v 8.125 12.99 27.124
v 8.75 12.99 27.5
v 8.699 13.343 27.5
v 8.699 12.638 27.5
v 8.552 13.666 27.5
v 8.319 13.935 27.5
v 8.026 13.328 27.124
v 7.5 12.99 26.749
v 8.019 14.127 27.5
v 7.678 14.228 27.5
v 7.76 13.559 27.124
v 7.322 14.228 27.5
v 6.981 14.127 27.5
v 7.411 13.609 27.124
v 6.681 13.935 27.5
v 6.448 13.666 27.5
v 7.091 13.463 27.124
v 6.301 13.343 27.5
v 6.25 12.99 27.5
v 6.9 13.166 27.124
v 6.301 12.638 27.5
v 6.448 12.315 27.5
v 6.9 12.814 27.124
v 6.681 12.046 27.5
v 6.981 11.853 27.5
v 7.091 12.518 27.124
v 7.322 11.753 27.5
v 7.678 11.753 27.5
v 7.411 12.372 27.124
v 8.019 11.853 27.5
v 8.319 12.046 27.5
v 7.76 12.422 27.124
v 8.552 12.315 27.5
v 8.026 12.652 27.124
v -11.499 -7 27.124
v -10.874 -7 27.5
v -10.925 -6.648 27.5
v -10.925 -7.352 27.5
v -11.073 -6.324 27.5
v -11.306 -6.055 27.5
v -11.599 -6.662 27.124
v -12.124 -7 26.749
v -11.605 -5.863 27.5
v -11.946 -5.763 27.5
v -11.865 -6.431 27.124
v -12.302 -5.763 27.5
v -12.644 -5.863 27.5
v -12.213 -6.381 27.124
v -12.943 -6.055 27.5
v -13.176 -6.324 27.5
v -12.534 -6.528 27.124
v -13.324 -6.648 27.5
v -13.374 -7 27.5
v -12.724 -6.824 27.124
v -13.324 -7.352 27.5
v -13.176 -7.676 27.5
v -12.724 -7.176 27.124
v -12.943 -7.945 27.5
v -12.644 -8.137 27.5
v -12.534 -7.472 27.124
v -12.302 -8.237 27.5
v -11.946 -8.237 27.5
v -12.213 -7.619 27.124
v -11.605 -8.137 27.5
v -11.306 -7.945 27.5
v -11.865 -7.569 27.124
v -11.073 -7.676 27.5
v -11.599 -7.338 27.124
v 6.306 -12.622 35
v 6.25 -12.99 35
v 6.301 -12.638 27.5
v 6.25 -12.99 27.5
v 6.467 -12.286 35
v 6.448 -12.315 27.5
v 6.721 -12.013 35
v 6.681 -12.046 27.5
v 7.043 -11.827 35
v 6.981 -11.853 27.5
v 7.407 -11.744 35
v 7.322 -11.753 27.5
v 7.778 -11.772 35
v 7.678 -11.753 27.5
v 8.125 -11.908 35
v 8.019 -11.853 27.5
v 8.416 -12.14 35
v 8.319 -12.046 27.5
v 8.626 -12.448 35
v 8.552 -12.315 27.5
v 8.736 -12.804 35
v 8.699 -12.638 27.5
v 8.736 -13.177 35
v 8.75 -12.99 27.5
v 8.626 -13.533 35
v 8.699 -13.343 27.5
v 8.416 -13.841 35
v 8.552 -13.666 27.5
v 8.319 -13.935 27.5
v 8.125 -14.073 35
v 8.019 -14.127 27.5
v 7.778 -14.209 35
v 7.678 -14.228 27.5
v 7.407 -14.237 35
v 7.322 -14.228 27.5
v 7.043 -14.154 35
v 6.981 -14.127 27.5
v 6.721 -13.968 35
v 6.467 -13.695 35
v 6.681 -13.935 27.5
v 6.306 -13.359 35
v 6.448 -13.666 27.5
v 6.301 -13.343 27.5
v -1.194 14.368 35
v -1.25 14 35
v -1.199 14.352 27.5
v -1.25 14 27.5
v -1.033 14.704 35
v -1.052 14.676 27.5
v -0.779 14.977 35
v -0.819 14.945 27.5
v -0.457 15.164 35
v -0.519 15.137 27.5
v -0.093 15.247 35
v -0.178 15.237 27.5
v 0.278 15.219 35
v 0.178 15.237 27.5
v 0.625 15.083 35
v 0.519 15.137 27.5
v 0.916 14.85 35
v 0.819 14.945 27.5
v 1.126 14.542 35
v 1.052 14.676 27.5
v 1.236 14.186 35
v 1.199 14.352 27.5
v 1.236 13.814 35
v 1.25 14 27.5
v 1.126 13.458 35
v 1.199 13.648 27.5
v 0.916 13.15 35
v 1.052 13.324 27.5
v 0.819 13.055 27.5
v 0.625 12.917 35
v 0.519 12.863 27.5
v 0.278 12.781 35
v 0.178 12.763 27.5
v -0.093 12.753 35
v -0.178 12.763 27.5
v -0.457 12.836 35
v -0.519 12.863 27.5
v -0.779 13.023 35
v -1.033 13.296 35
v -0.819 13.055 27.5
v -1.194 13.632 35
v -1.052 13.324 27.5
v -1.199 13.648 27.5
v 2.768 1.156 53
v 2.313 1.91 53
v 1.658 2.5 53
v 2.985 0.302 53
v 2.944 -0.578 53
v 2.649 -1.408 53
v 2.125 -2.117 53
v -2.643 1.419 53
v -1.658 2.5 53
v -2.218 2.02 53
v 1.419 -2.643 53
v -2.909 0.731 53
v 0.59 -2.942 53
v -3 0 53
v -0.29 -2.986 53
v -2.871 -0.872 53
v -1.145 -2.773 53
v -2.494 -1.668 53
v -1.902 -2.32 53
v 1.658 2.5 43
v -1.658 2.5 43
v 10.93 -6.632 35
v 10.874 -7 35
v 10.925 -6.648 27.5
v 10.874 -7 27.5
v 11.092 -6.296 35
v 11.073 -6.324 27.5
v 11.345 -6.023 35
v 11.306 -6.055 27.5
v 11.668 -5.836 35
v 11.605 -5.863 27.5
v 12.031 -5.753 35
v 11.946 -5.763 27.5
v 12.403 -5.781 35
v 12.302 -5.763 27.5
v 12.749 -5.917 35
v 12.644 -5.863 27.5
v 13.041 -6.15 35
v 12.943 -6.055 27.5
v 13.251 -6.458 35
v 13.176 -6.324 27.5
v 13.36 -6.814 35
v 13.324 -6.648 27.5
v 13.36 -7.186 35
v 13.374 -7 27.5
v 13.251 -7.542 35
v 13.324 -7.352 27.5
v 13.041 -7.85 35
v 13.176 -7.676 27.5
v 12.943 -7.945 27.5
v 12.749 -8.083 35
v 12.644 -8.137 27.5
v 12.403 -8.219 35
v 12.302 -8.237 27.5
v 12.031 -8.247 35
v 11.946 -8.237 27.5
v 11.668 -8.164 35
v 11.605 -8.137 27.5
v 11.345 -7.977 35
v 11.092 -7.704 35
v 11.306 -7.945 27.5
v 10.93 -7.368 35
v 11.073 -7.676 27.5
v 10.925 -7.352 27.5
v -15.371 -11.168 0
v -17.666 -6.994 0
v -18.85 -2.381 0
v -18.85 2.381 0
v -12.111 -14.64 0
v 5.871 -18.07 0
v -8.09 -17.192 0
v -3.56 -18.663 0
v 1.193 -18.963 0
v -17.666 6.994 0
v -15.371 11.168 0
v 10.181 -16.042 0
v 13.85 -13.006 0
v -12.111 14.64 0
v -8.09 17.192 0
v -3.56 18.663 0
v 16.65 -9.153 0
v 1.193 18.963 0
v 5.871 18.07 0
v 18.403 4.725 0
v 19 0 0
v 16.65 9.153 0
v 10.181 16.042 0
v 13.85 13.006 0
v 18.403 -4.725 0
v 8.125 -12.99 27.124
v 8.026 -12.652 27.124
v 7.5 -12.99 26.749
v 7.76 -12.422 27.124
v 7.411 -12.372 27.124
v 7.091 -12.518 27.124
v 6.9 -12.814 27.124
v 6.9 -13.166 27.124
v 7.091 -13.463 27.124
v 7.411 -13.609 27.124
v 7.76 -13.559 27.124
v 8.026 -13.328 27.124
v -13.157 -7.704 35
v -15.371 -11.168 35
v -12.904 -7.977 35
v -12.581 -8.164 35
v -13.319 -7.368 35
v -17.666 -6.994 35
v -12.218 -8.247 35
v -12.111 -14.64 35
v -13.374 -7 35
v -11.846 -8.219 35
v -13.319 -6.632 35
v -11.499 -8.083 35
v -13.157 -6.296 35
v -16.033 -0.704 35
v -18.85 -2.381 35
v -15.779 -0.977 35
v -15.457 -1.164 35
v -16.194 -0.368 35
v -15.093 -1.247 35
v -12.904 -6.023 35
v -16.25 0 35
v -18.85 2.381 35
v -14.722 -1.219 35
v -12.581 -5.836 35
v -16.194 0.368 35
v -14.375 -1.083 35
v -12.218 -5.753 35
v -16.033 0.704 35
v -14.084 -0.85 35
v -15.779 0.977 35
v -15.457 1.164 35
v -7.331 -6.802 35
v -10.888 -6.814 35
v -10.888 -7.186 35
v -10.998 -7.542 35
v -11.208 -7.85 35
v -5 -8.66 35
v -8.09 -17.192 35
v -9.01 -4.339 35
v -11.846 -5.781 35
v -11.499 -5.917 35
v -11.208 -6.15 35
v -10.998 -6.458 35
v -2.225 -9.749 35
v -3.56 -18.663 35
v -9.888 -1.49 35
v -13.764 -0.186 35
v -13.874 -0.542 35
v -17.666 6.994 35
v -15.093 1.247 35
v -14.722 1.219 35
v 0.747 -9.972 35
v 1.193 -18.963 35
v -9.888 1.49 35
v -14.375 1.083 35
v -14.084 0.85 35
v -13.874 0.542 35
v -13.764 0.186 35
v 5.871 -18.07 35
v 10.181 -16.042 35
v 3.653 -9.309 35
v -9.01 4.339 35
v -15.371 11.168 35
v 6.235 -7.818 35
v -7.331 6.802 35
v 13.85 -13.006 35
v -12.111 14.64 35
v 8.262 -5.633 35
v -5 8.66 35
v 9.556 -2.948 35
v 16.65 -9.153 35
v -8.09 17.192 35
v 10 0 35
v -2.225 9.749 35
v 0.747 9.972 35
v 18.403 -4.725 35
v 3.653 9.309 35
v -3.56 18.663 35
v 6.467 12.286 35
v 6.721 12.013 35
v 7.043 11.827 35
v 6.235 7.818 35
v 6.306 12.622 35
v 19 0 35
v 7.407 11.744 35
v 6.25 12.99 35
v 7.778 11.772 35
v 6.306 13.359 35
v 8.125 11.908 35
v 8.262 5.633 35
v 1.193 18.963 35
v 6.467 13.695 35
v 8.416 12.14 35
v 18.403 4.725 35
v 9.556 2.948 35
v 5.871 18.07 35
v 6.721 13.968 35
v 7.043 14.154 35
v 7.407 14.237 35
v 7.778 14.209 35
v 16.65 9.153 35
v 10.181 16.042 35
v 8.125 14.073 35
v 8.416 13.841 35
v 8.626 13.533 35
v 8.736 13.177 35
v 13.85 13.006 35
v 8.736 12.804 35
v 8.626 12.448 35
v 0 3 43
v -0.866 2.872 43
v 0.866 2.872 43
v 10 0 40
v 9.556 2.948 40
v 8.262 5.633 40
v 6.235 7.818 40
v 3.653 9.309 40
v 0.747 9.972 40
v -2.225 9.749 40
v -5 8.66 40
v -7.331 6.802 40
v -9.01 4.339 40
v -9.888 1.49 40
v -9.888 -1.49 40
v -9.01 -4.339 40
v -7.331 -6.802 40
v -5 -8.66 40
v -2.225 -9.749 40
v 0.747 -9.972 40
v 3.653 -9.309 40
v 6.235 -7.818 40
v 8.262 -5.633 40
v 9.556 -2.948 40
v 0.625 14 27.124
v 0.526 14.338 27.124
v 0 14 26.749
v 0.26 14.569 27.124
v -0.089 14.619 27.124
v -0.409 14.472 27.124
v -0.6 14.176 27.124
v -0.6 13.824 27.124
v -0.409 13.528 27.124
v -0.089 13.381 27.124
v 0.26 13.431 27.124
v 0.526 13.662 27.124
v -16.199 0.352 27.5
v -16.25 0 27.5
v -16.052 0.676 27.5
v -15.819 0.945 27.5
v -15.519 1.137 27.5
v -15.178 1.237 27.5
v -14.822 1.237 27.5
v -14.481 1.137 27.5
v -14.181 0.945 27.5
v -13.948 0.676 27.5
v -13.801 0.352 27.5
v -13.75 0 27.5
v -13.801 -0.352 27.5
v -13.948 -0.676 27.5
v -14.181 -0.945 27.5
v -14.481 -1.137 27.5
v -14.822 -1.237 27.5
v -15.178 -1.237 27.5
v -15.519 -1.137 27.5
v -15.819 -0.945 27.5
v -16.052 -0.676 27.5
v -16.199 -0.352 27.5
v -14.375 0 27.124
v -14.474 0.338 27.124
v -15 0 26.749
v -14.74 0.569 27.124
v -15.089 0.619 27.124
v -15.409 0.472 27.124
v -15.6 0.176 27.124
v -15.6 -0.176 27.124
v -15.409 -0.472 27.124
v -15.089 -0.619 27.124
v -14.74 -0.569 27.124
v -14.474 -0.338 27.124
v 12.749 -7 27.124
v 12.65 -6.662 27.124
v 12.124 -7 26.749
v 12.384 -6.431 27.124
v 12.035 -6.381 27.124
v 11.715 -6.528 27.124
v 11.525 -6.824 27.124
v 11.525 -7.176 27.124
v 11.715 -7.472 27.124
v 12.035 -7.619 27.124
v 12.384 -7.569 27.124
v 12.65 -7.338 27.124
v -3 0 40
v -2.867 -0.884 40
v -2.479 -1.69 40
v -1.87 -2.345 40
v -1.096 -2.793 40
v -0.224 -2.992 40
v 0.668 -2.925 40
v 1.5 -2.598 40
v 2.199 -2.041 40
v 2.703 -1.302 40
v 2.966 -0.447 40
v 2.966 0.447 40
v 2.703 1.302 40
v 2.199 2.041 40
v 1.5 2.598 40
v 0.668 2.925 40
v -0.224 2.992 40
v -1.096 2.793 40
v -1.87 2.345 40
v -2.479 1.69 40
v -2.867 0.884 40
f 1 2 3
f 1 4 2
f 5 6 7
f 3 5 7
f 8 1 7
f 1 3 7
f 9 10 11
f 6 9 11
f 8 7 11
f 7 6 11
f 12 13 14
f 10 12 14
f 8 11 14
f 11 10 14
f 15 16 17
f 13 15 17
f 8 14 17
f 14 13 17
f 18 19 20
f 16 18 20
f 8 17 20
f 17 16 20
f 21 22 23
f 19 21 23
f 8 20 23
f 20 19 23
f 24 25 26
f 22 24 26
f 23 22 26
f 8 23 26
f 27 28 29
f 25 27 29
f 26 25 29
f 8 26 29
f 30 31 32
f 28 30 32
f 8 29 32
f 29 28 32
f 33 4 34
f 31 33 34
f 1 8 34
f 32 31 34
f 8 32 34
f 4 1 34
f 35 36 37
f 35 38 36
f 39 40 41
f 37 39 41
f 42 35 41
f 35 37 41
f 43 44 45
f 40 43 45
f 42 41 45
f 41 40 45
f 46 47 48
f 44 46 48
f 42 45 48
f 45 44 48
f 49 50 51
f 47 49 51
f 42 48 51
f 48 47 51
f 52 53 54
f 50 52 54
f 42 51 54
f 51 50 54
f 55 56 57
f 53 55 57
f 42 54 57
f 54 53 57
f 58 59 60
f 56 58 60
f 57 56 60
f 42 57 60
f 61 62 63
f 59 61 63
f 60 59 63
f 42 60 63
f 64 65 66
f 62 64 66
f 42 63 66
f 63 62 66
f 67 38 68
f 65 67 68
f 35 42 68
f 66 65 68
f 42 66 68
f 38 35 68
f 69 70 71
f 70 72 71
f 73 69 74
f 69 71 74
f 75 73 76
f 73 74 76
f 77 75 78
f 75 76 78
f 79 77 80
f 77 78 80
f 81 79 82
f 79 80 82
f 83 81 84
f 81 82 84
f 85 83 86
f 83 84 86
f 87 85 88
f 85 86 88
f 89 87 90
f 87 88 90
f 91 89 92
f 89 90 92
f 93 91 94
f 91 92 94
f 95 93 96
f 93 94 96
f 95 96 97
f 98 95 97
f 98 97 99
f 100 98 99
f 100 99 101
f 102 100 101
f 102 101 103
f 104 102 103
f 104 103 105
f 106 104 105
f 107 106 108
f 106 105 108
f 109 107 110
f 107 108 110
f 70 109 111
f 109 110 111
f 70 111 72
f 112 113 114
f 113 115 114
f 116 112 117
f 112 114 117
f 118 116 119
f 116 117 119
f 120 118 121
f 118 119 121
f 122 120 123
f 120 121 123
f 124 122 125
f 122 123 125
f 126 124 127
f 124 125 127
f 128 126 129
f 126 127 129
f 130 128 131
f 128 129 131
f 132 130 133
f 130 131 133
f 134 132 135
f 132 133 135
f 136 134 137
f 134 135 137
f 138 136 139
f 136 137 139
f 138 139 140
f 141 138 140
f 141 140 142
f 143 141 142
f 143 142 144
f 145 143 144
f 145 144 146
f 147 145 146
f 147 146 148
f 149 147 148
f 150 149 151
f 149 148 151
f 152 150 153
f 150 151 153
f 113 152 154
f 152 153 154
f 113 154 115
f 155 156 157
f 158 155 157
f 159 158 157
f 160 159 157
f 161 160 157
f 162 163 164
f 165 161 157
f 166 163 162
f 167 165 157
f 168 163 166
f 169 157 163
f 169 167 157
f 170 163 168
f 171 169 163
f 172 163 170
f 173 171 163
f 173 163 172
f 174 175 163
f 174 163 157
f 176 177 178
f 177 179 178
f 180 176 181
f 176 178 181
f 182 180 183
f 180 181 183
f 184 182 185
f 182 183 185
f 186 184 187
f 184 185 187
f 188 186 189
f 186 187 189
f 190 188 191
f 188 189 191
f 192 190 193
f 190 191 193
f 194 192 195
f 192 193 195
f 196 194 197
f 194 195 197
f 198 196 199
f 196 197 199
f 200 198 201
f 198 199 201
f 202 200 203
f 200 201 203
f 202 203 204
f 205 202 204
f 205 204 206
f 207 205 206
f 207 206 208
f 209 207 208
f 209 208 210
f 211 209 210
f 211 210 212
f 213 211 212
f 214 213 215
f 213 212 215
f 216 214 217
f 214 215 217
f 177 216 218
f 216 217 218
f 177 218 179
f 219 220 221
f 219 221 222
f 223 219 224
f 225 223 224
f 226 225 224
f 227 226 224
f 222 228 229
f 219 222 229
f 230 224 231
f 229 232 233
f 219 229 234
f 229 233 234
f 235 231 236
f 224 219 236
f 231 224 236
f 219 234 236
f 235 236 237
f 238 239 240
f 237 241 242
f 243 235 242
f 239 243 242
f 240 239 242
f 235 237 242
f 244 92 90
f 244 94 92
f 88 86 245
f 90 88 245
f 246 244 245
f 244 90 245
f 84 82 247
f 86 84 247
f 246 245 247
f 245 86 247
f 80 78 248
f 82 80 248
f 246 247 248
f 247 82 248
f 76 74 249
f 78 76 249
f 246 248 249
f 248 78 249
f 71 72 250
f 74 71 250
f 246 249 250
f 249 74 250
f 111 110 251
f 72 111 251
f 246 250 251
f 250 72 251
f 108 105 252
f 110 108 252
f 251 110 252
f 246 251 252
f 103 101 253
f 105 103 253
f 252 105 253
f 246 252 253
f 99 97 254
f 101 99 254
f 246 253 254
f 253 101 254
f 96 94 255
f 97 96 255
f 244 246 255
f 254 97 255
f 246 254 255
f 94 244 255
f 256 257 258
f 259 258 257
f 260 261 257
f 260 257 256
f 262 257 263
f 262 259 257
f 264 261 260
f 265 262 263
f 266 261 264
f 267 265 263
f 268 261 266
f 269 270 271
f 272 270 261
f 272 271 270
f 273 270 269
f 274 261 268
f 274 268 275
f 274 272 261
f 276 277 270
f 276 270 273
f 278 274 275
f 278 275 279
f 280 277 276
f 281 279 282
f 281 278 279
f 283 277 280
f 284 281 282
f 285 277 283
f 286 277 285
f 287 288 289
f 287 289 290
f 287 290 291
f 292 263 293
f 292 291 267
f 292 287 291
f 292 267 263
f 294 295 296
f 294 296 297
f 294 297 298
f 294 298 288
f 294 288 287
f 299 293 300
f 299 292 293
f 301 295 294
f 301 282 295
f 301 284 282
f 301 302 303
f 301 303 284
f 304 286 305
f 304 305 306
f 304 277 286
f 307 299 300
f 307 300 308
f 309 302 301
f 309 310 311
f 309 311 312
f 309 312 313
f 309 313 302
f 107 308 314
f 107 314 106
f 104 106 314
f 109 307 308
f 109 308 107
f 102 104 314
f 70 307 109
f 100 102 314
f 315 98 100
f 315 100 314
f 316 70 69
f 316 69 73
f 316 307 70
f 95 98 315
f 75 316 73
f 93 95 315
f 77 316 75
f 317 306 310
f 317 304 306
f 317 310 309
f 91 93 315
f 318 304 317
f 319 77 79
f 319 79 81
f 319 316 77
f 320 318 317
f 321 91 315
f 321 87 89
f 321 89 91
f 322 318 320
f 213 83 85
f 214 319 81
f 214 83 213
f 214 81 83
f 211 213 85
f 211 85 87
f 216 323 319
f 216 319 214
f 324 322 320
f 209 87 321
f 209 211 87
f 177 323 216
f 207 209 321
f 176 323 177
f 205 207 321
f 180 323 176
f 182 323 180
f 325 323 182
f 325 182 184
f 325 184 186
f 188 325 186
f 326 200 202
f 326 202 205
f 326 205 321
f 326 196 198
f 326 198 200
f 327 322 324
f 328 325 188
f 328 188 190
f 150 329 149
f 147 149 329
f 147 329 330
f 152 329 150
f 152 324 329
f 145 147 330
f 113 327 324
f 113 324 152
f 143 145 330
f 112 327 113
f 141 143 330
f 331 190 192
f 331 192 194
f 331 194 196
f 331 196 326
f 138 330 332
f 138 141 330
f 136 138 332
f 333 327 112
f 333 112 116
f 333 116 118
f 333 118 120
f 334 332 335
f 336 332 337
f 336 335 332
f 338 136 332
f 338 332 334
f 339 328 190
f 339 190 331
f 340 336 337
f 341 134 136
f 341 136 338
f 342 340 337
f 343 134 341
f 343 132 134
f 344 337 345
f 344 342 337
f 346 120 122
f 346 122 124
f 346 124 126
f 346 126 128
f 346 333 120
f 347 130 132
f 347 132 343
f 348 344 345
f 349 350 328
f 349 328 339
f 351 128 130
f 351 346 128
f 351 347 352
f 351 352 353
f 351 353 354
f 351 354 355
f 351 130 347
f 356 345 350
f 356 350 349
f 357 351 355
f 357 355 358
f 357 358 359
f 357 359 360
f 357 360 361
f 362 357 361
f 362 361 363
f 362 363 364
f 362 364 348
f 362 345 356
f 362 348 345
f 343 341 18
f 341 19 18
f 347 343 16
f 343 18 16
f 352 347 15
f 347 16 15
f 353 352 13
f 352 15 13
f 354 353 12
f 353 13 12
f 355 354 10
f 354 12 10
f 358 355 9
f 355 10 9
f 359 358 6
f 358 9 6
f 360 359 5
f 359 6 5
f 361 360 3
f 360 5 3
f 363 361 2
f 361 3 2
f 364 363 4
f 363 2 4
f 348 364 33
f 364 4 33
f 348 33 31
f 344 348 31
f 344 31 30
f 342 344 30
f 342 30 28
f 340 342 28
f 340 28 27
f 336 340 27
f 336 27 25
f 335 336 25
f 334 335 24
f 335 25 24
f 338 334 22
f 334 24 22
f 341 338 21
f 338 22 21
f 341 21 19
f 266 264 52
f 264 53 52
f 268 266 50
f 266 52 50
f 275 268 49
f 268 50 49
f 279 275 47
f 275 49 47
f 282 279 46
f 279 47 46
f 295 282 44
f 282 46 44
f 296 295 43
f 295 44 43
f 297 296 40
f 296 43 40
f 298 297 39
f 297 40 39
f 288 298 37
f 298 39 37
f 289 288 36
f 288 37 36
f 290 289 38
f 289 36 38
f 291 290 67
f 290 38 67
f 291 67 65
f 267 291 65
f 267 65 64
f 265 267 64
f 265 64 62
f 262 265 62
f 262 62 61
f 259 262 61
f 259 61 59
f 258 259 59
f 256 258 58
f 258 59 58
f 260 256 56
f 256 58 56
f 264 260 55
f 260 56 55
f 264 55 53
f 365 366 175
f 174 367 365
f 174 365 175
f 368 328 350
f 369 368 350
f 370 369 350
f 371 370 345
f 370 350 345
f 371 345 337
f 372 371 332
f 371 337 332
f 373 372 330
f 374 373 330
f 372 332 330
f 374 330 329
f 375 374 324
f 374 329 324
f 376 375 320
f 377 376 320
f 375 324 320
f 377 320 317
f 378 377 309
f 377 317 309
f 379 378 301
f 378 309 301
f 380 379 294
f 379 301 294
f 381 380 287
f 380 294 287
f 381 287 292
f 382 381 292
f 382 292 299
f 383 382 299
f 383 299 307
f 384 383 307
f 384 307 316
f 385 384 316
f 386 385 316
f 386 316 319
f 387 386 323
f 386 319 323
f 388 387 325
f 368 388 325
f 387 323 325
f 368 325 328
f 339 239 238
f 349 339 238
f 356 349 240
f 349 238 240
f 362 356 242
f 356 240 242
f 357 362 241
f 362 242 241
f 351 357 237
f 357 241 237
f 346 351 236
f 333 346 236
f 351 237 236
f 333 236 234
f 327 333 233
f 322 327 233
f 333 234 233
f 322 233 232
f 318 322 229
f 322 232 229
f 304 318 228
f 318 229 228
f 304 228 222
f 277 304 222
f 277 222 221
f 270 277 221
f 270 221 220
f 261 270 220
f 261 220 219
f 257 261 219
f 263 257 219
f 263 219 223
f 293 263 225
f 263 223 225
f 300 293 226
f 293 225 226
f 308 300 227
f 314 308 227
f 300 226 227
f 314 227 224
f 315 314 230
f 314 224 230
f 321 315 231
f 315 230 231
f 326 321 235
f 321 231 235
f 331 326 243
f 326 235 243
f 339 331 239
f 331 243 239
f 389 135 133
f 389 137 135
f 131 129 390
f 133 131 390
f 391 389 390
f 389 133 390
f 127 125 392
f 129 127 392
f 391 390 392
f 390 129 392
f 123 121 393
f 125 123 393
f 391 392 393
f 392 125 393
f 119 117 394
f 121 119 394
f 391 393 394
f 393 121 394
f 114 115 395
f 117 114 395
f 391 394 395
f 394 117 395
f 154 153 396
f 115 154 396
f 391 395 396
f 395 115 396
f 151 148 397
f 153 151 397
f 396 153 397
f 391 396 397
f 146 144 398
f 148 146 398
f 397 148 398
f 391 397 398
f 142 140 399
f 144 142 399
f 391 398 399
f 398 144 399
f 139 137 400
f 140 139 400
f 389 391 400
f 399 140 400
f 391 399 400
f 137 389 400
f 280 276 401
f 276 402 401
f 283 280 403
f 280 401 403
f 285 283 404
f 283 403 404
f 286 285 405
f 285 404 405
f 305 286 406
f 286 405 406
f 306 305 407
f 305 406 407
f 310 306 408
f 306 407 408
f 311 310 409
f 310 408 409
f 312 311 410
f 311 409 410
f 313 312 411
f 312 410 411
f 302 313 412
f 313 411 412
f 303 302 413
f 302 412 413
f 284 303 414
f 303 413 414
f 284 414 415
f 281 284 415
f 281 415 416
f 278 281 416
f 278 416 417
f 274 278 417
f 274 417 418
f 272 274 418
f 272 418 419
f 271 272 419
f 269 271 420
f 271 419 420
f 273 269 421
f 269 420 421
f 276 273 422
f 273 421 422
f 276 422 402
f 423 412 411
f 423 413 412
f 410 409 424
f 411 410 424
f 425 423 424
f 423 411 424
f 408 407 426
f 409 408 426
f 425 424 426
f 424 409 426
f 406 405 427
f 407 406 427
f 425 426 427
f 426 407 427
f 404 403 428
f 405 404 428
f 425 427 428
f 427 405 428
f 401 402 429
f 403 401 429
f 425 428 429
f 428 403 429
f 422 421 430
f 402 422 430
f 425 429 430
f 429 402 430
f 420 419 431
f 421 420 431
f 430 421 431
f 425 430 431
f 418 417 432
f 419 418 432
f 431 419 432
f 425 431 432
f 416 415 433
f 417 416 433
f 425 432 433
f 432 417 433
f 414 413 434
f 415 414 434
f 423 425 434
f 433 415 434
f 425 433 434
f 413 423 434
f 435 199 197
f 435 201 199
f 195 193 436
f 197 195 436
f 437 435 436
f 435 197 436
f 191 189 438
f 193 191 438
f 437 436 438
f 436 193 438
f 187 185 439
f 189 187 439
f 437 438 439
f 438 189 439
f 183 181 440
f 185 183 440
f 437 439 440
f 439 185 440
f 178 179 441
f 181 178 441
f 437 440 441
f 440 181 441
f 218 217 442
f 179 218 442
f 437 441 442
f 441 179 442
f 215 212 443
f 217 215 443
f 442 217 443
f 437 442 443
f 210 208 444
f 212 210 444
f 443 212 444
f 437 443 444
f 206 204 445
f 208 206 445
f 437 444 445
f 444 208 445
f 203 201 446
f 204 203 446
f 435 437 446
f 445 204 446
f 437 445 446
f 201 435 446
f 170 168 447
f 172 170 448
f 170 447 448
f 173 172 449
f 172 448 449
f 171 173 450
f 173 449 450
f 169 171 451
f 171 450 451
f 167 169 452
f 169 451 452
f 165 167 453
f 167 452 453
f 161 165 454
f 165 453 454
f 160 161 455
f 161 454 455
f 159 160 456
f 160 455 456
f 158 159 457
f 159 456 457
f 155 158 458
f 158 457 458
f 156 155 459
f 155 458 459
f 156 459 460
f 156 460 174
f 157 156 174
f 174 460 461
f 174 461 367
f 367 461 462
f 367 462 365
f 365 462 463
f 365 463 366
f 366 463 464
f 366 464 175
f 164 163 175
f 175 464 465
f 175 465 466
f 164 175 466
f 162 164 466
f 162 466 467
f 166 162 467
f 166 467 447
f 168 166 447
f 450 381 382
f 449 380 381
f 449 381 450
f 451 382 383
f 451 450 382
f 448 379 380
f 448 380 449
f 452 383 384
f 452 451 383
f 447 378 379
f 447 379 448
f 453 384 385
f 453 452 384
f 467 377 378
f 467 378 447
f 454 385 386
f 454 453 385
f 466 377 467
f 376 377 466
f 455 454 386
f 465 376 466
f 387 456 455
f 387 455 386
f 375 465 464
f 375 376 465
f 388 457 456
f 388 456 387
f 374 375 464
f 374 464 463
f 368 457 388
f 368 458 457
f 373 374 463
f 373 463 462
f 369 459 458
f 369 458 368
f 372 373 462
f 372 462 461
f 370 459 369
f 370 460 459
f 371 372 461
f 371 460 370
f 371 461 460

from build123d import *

# Parameters (mm, degrees)
SKETCH1_R                 = 19
BOSS_EXTRUDE1_DEPTH       = 35
BOSS_EXTRUDE2_START       = 35
SKETCH2_R                 = 10
BOSS_EXTRUDE2_DEPTH       = 5
BOSS_EXTRUDE3_START       = 40
SKETCH3_R                 = 3
BOSS_EXTRUDE3_DEPTH       = 13
CUT_EXTRUDE1_START        = -10
CUT_EXTRUDE1_DEPTH        = 10
M3X0_5_TAPPED_HOLE1_D     = 2.5
M3X0_5_TAPPED_HOLE1_DEPTH = 7.5
M3X0_5_TAPPED_HOLE1_TIP   = 0.751075774


with BuildPart() as part:
    # Sketch1 → Boss-Extrude1 (new body)
    with BuildSketch(Plane.XY):
        Circle(SKETCH1_R)
    extrude(amount=BOSS_EXTRUDE1_DEPTH)

    # Sketch2 → Boss-Extrude2 (add)
    with BuildSketch(Plane.XY.offset(BOSS_EXTRUDE2_START)):
        Circle(SKETCH2_R)
    extrude(amount=BOSS_EXTRUDE2_DEPTH)

    # Sketch3 → Boss-Extrude3 (add)
    with BuildSketch(Plane.XY.offset(BOSS_EXTRUDE3_START)):
        with Locations(Location((0, 0, 0), (0, 0, 180))):
            Circle(SKETCH3_R)
    extrude(amount=BOSS_EXTRUDE3_DEPTH)

    # Sketch4 → Cut-Extrude1 (cut)
    with BuildSketch(Plane.XY.offset(53).offset(CUT_EXTRUDE1_START)):
        with BuildLine():
            Line((-1.658312395, 2.5), (1.658312395, 2.5))
            ThreePointArc((1.658312395, 2.5), (0, 3), (-1.658312395, 2.5))
        make_face()
    extrude(amount=CUT_EXTRUDE1_DEPTH, mode=Mode.SUBTRACT)

    # M3x0.5 Tapped Hole1
    with Locations(Plane.XY.offset(35)):
        with Locations((0, 14), (7.5, 12.990381057), (12.124355653, -7), (7.5, -12.990381057), (-12.124355653, -7), (-15, 0)):
            Hole(M3X0_5_TAPPED_HOLE1_D / 2, depth=M3X0_5_TAPPED_HOLE1_DEPTH)
            with Locations((0, 0, -(M3X0_5_TAPPED_HOLE1_DEPTH + M3X0_5_TAPPED_HOLE1_TIP / 2))):  # 118° drill point
                Cone(0, M3X0_5_TAPPED_HOLE1_D / 2, M3X0_5_TAPPED_HOLE1_TIP, mode=Mode.SUBTRACT)


solid = part.part
